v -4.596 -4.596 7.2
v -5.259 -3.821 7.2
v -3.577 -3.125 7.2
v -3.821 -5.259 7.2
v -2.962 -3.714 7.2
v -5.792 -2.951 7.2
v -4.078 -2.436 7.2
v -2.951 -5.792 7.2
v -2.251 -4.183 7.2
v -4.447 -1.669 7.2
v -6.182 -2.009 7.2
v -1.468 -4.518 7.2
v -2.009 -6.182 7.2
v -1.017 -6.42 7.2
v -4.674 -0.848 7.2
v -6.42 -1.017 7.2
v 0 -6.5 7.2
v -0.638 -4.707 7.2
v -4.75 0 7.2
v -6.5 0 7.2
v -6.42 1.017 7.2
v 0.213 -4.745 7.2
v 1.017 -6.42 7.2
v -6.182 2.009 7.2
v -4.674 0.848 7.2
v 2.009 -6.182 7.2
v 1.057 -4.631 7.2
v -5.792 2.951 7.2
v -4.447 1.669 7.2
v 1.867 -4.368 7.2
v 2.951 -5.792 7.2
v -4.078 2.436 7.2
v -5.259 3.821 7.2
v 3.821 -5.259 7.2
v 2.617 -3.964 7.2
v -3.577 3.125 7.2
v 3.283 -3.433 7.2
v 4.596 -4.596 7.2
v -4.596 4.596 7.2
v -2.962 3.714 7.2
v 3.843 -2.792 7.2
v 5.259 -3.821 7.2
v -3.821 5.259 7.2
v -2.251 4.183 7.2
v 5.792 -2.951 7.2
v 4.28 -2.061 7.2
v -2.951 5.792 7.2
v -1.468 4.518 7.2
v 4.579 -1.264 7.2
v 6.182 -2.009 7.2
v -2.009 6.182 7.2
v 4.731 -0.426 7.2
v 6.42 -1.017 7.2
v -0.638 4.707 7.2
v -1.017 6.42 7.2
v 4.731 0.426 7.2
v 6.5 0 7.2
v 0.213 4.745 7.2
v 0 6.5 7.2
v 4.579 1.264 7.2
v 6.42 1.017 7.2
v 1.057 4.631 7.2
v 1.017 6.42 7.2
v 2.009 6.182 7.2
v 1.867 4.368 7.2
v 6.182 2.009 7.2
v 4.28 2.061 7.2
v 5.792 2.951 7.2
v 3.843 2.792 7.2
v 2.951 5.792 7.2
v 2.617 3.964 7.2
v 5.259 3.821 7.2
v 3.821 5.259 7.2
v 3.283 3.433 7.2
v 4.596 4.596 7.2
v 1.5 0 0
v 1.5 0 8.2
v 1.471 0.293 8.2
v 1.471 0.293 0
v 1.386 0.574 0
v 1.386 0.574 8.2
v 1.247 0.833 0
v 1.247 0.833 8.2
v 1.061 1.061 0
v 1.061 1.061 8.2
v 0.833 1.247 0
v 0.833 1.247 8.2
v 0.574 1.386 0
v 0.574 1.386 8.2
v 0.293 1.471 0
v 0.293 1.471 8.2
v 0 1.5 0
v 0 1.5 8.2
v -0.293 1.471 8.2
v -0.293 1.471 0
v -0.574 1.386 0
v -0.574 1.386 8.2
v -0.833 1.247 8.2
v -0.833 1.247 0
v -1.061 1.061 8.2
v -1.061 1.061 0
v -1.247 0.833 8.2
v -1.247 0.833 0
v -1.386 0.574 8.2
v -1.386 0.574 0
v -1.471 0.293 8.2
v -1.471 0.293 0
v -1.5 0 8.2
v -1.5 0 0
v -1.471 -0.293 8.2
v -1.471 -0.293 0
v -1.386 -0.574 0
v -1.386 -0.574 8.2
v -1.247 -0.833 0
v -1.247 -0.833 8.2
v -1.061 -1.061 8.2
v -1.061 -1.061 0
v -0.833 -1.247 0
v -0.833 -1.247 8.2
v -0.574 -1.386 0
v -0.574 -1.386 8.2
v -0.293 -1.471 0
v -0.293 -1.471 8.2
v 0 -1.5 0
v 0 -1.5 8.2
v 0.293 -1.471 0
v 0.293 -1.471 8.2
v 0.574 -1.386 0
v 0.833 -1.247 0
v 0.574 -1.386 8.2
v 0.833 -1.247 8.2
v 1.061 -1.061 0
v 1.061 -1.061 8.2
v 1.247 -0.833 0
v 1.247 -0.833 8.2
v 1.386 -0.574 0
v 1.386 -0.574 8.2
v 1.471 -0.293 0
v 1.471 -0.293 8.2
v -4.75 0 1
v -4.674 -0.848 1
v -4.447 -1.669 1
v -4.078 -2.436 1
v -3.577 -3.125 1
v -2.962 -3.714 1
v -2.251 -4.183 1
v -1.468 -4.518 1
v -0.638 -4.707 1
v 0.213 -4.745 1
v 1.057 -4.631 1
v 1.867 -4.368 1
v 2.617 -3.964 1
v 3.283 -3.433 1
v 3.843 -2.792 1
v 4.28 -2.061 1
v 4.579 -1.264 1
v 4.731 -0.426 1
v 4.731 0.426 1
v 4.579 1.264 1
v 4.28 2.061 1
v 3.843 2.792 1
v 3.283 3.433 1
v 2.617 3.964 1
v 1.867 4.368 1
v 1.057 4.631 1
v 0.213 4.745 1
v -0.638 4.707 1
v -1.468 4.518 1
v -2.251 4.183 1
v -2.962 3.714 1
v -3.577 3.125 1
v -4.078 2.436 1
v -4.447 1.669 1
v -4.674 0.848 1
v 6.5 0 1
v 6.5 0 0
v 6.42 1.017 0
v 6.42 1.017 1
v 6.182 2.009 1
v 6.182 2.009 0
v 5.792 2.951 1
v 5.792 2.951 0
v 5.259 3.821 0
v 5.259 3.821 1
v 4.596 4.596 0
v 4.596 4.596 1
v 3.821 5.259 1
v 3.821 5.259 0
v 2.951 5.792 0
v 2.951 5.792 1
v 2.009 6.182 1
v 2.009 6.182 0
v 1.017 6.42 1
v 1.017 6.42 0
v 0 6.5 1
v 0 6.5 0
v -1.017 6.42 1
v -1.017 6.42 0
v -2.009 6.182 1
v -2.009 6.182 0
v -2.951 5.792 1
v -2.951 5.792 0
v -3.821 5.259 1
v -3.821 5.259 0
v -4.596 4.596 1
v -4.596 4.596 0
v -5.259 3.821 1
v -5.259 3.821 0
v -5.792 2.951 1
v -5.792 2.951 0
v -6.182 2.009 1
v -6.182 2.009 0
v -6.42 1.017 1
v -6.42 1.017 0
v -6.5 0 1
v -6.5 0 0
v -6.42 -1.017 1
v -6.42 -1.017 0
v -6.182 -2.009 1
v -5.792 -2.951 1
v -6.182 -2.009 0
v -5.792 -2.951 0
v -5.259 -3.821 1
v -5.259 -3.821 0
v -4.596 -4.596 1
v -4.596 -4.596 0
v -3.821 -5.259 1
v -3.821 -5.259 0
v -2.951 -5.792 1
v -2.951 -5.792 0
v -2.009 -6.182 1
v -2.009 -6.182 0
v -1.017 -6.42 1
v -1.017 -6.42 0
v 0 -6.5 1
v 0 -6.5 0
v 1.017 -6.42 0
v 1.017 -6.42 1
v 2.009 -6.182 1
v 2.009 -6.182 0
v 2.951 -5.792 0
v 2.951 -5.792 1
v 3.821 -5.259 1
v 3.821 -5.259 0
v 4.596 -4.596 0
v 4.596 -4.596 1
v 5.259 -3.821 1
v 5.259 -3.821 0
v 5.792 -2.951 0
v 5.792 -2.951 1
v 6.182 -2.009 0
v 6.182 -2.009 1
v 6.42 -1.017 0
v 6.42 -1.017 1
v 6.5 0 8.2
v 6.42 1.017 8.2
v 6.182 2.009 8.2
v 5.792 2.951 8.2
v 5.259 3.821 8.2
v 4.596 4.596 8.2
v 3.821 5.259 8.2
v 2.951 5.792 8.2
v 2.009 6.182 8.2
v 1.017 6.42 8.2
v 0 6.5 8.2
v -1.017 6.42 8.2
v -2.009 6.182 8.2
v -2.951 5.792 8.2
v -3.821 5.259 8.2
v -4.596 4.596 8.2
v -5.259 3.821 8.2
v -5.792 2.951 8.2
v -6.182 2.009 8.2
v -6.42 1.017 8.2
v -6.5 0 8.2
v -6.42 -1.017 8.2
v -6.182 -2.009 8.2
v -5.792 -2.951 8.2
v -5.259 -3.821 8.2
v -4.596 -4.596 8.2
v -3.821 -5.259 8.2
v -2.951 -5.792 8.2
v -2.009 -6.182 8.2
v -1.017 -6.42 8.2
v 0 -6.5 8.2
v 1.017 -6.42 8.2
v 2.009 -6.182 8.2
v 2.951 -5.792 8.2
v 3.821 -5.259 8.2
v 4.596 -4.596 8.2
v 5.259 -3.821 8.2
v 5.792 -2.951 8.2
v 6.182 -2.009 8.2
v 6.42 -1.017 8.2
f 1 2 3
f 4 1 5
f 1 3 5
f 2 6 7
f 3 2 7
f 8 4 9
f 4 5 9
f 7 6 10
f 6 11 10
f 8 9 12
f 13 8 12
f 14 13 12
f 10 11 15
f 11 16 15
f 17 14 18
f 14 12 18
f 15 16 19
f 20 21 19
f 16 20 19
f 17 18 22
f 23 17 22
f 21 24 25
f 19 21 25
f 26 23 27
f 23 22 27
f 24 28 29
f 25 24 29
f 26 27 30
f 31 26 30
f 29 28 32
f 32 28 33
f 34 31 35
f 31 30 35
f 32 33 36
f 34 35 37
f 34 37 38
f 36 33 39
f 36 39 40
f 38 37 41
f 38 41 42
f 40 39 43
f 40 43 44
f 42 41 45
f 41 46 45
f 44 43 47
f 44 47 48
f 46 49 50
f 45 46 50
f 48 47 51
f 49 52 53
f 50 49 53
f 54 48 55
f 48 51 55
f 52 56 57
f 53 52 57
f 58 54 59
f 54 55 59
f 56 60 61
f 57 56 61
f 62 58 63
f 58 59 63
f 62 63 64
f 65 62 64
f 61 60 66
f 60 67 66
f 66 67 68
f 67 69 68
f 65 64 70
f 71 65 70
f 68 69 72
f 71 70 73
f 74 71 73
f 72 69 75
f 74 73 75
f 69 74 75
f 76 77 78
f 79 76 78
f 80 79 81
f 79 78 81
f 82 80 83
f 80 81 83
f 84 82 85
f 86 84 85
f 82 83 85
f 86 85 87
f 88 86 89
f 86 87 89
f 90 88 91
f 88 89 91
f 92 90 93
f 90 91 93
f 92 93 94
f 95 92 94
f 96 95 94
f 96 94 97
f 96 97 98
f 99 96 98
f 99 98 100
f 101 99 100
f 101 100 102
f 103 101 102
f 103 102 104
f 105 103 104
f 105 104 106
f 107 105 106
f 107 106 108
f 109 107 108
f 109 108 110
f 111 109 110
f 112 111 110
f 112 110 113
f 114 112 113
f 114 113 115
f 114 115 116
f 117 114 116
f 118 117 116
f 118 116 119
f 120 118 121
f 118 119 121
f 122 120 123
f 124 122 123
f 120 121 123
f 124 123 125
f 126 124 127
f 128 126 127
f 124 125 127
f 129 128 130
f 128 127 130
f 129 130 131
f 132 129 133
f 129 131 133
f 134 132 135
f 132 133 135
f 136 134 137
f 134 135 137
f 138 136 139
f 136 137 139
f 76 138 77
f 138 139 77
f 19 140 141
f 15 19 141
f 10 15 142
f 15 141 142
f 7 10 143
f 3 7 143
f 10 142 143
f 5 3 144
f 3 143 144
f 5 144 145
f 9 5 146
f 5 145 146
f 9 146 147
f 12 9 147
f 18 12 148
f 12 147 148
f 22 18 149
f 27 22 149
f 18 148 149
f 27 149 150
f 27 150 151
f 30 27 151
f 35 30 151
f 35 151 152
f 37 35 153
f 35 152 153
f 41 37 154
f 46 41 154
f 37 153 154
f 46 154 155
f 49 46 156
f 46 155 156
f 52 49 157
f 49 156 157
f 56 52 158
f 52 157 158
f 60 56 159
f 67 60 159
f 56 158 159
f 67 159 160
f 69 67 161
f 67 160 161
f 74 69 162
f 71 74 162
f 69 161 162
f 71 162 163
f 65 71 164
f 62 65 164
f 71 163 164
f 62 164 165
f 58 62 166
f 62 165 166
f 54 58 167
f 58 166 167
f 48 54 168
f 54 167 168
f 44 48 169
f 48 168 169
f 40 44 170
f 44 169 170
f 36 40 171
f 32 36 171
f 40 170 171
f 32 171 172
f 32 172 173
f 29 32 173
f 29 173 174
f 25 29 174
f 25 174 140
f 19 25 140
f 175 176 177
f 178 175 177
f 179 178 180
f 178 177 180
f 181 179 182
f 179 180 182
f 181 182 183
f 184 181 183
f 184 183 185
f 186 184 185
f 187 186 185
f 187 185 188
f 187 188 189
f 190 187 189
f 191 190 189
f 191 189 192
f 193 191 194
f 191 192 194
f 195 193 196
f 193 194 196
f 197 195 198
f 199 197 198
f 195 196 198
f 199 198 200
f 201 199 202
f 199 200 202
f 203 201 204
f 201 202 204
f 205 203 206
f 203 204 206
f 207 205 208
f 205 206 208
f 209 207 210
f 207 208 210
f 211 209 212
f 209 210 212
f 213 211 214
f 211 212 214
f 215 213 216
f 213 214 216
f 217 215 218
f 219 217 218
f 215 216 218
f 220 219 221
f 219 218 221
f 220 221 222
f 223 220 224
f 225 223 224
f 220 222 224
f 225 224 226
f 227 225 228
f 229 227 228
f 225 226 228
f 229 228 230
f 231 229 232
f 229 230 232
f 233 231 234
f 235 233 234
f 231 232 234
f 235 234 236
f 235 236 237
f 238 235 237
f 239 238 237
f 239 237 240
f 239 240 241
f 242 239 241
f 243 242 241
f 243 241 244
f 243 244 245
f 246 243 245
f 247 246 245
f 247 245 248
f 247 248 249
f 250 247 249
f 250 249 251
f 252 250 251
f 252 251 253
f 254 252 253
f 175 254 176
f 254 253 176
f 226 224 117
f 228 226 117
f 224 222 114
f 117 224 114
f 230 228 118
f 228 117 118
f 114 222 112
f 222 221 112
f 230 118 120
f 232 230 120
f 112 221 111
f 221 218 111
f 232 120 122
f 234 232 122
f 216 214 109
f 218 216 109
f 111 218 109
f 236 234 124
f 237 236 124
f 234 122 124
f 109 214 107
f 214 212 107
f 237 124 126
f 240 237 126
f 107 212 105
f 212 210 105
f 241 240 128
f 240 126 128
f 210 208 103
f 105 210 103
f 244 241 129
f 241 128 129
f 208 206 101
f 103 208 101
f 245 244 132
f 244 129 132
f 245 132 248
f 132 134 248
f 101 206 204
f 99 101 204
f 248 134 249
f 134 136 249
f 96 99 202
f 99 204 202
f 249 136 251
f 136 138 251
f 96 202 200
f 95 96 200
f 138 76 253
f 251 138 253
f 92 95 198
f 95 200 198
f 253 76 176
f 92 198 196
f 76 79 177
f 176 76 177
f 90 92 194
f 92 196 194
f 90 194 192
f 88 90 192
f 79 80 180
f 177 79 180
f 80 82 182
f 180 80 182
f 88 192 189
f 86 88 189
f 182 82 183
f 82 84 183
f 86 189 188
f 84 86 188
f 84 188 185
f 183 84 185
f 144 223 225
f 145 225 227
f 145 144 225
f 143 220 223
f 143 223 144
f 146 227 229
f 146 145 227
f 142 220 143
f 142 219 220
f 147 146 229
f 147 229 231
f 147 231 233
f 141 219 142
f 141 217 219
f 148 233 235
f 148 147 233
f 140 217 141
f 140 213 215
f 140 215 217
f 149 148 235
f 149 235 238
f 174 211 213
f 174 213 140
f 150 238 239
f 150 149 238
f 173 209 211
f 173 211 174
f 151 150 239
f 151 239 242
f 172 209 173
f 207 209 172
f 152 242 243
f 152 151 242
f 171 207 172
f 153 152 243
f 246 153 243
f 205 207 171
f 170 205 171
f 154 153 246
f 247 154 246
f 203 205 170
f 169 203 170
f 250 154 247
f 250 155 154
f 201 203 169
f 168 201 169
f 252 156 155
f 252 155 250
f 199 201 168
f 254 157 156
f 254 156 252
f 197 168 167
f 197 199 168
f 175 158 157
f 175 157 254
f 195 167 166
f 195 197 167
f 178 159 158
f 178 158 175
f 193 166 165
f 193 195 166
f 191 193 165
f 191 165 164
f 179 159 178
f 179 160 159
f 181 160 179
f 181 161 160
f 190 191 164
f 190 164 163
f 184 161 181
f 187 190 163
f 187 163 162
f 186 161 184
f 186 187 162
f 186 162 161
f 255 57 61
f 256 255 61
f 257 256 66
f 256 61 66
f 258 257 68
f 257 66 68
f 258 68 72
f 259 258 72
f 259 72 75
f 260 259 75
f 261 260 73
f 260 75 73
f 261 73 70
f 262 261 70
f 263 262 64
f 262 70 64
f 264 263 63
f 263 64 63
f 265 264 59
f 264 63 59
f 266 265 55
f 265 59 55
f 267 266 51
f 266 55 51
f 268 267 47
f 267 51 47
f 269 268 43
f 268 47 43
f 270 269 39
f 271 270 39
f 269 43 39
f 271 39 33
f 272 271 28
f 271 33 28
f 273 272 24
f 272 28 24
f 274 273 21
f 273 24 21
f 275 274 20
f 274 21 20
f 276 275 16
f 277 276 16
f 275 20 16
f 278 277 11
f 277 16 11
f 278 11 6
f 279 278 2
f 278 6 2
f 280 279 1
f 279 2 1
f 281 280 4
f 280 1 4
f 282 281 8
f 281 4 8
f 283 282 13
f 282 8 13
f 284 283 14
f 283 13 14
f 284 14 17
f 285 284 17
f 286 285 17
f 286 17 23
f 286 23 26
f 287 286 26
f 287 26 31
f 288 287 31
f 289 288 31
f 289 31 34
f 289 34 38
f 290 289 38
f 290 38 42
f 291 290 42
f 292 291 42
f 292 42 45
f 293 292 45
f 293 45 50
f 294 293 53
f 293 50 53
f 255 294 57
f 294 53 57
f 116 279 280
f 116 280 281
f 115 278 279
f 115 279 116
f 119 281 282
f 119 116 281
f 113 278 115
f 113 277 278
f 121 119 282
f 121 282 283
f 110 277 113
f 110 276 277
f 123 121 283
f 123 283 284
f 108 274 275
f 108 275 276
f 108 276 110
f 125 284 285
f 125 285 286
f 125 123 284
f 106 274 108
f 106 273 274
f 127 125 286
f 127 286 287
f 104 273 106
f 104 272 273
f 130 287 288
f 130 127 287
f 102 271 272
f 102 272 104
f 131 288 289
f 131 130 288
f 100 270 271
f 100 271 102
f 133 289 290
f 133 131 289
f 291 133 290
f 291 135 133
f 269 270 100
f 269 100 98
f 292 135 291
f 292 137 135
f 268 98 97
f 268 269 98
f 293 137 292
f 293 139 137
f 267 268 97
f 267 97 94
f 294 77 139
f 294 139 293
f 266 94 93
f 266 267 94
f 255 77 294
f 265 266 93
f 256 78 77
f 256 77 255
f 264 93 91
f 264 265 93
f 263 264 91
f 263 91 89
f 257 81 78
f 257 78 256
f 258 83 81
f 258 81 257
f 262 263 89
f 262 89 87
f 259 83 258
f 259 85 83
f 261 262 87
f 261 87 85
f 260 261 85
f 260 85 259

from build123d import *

# Parameters (mm, degrees)
ESQUISSE1_R             = 6.5
BOSS_EXTRU_1_DEPTH      = 1
ESQUISSE2_R             = 4.75
BOSS_EXTRU_2_DEPTH      = 6.2
ESQUISSE3_R             = 6.5
BOSS_EXTRU_3_DEPTH      = 1
ESQUISSE4_R             = 1.5
ENL_V_MAT_EXTRU_1_DEPTH = 10


with BuildPart() as part:
    # Esquisse1 → Boss.-Extru.1 (new body)
    with BuildSketch(Plane.XY):
        Circle(ESQUISSE1_R)
    extrude(amount=BOSS_EXTRU_1_DEPTH)

    # Esquisse2 → Boss.-Extru.2 (add)
    with BuildSketch(Plane.XY.offset(1)):
        with Locations(Location((0, 0, 0), (0, 0, 180))):
            Circle(ESQUISSE2_R)
    extrude(amount=BOSS_EXTRU_2_DEPTH)

    # Esquisse3 → Boss.-Extru.3 (add)
    with BuildSketch(Plane.XY.offset(7.2)):
        Circle(ESQUISSE3_R)
    extrude(amount=BOSS_EXTRU_3_DEPTH)

    # Esquisse4 → Enlèv. mat.-Extru.1 (cut)
    with BuildSketch(Plane.XY.offset(8.2)):
        Circle(ESQUISSE4_R)
    extrude(amount=-ENL_V_MAT_EXTRU_1_DEPTH, mode=Mode.SUBTRACT)


solid = part.part
